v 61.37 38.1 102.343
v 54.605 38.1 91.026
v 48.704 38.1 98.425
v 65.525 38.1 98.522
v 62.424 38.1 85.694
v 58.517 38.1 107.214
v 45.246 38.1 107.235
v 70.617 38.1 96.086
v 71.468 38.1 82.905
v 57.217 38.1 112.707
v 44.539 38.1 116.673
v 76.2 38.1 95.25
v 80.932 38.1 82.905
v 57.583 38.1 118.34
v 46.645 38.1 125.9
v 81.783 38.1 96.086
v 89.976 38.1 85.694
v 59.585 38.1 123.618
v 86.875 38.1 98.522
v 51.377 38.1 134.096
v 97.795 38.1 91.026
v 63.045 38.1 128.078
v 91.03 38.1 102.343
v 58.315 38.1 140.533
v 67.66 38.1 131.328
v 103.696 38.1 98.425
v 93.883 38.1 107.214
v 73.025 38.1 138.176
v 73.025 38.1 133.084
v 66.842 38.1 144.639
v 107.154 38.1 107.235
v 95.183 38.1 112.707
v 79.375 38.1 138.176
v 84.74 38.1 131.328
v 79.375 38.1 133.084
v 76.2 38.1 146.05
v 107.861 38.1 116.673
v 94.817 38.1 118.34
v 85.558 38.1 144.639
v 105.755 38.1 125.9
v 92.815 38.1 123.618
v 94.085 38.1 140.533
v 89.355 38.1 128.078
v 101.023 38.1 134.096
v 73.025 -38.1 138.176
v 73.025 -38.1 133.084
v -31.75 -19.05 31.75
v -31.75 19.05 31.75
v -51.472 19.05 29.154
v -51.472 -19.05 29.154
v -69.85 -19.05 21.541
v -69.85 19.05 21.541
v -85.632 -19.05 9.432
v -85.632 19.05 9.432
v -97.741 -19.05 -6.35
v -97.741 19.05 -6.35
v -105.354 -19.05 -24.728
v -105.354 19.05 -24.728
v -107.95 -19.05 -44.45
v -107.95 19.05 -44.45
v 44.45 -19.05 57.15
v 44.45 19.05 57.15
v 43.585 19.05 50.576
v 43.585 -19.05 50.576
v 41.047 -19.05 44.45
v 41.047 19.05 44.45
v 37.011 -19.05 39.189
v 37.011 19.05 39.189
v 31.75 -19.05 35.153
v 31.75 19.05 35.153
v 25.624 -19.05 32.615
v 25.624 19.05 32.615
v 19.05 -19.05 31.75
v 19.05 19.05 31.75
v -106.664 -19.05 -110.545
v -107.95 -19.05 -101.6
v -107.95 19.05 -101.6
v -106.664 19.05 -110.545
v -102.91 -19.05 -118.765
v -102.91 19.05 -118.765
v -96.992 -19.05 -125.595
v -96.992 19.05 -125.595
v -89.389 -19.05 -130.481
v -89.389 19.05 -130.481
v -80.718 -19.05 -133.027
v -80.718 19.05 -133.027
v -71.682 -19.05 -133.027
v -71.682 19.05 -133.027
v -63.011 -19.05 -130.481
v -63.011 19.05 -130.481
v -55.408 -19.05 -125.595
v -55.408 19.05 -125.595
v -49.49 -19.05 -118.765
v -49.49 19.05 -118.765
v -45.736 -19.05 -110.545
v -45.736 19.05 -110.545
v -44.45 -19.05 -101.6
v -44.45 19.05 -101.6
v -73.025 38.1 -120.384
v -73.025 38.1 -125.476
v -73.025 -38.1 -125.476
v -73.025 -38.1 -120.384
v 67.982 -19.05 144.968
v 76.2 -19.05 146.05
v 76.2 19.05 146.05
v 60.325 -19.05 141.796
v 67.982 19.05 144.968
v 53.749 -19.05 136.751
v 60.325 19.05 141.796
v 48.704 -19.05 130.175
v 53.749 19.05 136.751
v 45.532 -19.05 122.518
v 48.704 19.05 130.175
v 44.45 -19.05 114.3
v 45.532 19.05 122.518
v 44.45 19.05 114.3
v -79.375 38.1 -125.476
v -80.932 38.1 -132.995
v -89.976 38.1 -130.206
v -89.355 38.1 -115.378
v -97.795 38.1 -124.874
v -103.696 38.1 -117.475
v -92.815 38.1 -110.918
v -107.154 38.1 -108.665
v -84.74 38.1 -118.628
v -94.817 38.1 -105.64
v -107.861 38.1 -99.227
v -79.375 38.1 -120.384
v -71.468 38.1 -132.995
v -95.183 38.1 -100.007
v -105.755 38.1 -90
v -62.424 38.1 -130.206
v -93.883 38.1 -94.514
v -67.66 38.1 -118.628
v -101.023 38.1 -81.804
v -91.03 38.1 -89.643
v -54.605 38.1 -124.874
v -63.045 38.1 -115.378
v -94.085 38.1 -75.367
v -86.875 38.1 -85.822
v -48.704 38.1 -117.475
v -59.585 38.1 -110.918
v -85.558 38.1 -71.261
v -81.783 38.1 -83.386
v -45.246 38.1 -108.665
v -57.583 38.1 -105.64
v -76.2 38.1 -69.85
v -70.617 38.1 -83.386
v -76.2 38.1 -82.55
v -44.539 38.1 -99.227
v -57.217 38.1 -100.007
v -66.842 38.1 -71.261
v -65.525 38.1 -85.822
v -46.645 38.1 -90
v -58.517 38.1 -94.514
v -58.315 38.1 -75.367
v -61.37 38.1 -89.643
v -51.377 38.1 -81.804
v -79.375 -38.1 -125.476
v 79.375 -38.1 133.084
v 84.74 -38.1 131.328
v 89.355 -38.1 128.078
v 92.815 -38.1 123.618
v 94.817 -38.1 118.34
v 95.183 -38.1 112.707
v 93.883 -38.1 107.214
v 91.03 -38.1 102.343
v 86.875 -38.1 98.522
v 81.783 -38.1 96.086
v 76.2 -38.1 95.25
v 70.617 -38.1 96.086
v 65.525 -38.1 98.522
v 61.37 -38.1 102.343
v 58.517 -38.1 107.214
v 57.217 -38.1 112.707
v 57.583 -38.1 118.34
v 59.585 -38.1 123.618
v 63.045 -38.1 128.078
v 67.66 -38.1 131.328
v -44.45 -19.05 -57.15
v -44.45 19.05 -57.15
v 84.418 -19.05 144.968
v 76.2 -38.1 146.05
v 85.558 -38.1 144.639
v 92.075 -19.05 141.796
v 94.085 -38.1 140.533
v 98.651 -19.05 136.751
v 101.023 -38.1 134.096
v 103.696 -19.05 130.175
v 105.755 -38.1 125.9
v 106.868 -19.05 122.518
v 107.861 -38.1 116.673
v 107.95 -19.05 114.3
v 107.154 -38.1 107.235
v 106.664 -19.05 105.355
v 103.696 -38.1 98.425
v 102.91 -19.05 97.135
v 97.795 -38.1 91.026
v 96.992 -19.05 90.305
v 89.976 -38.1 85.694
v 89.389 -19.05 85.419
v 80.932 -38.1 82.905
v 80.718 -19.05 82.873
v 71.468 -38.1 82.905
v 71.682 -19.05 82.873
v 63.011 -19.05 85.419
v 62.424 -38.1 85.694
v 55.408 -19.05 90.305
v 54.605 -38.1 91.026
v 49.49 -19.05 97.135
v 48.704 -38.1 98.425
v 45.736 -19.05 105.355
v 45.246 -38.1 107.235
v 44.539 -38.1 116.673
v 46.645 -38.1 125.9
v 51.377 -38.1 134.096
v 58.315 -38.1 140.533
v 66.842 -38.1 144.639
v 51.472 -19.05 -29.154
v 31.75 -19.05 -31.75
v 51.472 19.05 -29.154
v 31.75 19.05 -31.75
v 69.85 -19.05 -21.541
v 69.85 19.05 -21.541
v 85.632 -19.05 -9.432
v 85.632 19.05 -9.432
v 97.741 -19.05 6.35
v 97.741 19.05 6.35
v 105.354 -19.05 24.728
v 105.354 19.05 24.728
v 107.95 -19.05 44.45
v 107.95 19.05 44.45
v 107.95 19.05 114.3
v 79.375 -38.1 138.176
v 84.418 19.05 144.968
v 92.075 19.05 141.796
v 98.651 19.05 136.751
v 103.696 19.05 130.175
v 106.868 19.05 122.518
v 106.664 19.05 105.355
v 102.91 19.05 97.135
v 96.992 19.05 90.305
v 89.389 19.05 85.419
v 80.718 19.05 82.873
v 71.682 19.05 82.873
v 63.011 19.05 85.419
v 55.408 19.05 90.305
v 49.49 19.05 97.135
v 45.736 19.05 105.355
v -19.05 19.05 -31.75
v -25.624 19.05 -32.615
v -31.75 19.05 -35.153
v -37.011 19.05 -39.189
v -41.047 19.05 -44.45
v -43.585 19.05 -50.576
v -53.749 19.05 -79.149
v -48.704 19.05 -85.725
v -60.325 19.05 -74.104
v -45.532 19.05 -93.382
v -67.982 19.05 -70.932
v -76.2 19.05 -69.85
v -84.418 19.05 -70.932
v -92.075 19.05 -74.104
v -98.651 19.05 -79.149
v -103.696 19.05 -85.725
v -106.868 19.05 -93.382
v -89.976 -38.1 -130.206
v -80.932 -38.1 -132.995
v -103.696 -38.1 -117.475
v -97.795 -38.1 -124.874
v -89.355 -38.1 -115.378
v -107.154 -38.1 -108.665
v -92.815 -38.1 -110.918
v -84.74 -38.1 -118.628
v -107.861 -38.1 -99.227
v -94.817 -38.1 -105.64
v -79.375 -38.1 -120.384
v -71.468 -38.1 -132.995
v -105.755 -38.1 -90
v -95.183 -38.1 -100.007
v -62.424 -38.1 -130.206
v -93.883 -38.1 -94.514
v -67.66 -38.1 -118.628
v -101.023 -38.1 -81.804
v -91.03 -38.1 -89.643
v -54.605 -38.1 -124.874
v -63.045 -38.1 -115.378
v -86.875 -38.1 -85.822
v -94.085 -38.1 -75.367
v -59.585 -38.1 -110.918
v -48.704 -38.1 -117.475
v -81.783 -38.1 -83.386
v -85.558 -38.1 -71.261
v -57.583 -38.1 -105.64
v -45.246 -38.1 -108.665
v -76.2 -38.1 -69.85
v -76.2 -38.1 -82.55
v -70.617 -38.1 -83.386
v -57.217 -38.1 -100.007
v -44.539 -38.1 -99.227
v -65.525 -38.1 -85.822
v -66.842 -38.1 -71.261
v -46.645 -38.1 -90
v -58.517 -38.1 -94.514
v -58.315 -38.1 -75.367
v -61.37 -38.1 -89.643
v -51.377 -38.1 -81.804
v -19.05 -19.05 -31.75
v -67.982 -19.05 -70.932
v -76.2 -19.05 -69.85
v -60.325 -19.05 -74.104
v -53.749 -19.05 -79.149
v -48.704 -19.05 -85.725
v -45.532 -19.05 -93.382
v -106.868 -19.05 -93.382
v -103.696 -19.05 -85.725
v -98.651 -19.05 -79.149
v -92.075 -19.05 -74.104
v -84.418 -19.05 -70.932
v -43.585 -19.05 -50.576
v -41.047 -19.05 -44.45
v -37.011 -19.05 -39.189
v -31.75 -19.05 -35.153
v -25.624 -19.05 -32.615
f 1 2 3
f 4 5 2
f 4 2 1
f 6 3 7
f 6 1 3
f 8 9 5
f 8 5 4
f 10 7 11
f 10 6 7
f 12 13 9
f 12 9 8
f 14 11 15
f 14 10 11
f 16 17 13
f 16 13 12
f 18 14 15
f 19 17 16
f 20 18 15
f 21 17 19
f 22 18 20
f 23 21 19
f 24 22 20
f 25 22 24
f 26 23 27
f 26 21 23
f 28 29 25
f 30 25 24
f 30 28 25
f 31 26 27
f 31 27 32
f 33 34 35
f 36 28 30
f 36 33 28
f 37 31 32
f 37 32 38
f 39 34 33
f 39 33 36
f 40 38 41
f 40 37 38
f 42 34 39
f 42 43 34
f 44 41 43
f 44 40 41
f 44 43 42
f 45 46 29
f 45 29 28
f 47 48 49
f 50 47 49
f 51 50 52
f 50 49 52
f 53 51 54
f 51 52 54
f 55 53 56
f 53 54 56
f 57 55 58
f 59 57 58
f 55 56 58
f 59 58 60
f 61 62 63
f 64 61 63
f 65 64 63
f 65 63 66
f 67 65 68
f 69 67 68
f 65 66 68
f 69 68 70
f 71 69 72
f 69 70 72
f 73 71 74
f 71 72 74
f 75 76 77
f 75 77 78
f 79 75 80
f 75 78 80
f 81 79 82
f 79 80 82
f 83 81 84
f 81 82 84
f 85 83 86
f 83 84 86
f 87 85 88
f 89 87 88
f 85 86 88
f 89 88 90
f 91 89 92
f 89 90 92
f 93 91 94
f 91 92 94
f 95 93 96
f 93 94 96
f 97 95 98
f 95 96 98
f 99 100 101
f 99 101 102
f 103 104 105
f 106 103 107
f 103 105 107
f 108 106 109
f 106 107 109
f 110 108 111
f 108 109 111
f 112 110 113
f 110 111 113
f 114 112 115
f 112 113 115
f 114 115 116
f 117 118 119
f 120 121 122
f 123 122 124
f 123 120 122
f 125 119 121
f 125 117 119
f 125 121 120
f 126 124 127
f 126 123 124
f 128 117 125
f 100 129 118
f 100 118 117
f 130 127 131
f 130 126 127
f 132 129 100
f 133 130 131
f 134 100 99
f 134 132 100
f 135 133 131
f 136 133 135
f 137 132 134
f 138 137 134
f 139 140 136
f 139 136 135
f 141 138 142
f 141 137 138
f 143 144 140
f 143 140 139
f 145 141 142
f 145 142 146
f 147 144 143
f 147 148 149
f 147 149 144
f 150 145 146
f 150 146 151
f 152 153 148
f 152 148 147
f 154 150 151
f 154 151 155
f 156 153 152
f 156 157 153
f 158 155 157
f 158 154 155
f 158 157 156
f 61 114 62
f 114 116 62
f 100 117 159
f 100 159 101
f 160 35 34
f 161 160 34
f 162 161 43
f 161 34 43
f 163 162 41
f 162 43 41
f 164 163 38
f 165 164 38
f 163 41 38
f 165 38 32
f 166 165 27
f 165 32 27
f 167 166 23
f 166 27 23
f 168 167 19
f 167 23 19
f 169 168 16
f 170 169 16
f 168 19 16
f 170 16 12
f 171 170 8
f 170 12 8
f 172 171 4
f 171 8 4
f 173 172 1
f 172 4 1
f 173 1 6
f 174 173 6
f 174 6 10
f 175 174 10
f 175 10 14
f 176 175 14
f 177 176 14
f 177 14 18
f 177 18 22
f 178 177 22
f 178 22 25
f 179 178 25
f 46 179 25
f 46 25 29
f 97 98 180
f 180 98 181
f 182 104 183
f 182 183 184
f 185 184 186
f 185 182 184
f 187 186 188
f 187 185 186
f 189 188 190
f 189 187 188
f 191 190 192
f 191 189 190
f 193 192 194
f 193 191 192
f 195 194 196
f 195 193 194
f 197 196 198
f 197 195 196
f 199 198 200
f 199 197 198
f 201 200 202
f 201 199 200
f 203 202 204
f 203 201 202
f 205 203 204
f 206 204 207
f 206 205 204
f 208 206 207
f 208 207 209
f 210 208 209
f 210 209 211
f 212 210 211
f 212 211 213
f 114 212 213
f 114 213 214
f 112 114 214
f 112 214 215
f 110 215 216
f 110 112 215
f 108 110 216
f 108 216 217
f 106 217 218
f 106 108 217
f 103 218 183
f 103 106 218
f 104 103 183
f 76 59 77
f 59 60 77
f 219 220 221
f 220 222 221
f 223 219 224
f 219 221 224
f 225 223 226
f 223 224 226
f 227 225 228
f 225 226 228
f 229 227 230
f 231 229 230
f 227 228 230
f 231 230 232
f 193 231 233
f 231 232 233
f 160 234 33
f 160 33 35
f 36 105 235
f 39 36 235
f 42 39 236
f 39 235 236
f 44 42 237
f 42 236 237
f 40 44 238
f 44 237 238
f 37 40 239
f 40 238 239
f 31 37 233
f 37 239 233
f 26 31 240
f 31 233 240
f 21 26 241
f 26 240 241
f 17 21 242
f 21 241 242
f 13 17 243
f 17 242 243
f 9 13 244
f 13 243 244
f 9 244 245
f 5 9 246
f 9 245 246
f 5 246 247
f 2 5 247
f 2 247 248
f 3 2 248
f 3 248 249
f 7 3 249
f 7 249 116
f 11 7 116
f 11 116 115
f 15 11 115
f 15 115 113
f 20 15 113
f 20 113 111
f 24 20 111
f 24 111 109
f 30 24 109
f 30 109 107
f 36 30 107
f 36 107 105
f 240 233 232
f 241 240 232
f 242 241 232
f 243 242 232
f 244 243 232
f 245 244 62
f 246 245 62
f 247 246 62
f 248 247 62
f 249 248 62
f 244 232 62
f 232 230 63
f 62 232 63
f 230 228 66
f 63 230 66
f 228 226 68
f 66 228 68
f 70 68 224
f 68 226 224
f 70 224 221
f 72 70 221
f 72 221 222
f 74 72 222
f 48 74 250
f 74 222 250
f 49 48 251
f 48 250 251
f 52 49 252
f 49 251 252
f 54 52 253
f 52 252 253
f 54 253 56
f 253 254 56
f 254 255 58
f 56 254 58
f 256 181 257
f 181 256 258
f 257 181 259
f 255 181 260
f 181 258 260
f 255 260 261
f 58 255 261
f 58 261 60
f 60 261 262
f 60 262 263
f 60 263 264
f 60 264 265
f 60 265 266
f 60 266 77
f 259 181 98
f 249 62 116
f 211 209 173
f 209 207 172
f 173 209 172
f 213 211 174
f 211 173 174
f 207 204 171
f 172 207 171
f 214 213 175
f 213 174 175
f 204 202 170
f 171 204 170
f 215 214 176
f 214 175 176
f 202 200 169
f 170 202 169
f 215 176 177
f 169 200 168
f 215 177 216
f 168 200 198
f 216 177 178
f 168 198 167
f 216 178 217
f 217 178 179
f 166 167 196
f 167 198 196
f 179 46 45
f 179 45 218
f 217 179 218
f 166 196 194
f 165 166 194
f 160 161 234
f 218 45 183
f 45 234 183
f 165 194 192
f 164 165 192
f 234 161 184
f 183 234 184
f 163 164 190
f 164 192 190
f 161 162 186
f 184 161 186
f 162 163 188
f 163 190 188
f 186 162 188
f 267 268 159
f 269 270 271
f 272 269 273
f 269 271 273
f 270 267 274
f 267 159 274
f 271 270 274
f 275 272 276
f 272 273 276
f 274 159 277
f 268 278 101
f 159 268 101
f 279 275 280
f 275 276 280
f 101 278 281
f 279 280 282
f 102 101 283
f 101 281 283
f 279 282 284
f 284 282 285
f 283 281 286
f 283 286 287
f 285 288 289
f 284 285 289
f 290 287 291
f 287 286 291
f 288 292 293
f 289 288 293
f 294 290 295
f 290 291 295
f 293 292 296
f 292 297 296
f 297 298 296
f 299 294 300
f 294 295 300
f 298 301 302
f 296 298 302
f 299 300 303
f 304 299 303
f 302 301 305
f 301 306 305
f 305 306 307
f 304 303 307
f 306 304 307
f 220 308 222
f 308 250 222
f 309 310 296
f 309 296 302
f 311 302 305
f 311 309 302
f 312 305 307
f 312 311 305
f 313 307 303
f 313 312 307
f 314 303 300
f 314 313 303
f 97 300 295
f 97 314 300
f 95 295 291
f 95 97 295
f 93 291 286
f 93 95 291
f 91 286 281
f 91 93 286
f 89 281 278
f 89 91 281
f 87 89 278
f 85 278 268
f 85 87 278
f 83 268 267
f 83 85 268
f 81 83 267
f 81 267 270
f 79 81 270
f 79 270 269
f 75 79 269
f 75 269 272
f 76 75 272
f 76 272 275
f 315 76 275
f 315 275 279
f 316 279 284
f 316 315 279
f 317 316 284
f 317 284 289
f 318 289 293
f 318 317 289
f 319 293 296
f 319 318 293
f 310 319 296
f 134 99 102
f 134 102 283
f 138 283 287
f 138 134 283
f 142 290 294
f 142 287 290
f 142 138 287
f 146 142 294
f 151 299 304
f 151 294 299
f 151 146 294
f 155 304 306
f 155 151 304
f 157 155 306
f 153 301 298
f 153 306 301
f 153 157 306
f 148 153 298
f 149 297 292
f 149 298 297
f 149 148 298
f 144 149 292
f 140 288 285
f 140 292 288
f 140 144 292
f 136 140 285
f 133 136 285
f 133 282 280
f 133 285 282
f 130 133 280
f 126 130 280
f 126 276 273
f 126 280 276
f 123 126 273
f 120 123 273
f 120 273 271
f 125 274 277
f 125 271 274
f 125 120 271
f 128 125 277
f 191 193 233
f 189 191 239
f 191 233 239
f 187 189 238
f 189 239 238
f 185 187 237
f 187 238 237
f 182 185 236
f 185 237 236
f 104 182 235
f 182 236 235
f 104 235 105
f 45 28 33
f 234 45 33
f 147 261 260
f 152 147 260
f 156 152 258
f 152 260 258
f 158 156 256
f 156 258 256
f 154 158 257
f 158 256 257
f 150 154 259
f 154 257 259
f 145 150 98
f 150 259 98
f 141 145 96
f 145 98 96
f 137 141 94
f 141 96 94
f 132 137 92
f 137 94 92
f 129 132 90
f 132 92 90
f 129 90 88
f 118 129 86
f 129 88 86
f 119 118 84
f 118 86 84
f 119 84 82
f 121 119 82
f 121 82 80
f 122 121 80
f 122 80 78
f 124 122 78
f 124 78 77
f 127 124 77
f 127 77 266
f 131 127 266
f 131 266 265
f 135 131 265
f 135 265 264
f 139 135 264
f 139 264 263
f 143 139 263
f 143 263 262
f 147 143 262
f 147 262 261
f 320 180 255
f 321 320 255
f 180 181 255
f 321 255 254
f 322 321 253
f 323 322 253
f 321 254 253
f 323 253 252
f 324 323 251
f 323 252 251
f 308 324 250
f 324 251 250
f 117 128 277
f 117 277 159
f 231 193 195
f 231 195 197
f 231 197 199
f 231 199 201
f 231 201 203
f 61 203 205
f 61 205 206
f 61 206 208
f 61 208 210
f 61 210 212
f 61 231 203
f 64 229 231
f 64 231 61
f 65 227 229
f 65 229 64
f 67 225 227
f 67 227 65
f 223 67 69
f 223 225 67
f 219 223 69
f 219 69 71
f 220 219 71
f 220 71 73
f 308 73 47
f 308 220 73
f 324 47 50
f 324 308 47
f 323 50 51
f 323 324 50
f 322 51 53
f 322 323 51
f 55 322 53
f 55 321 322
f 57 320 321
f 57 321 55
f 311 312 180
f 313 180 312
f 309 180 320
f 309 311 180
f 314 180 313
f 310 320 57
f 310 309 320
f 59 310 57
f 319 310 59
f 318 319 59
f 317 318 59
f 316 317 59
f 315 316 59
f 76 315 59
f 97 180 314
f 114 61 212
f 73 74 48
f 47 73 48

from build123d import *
from build123d.topology import SkipClean

# Parameters (mm, degrees)
BOSS_EXTRUDE1_DEPTH      = 19.05
BOSS_EXTRUDE2_DEPTH      = 19.05
BOSS_EXTRUDE2_DEPTH_BACK = 57.15
SKETCH2_R                = 31.75
CUT_EXTRUDE1_DEPTH       = 197.952392725


with BuildPart() as part:
    # Sketch1 → Boss-Extrude1 (new, symmetric)
    with BuildSketch(Plane(origin=(0, 0, 0), x_dir=(1, 0, 0), z_dir=(0, 1, 0))):
        with BuildLine():
            Line((0, -31.75), (-31.75, -31.75))
            ThreePointArc((-31.75, -31.75), (-85.631536726, -9.431536726), (-107.95, 44.45))
            Line((-107.95, 44.45), (-107.95, 101.6))
            ThreePointArc((-107.95, 101.6), (-76.2, 133.35), (-44.45, 101.6))
            Line((-44.45, 101.6), (-44.45, 57.15))
            ThreePointArc((-44.45, 57.15), (-37.010512242, 39.189487758), (-19.05, 31.75))
            Line((-19.05, 31.75), (0, 31.75))
            Line((0, 31.75), (31.75, 31.75))
            ThreePointArc((31.75, 31.75), (85.631536726, 9.431536726), (107.95, -44.45))
            Line((107.95, -44.45), (107.95, -114.3))
            ThreePointArc((107.95, -114.3), (76.2, -146.05), (44.45, -114.3))
            Line((44.45, -114.3), (44.45, -57.15))
            ThreePointArc((44.45, -57.15), (37.010512242, -39.189487758), (19.05, -31.75))
            Line((19.05, -31.75), (0, -31.75))
        make_face()
    extrude(amount=BOSS_EXTRUDE1_DEPTH, both=True)

    # Sketch2 → Boss-Extrude2 (add, two sides: drawn at the far end of the back side and taken through both)
    with SkipClean():  # the faces are left unmerged after this step: merging them gives an invalid solid
        with BuildSketch(Plane(origin=(0, 19.05, 0), x_dir=(1, 0, 0), z_dir=(0, 1, 0)).offset(-BOSS_EXTRUDE2_DEPTH_BACK)):
            with Locations((-76.2, 101.6)):
                Circle(SKETCH2_R)
            with Locations((76.2, -114.3)):
                Circle(SKETCH2_R)
        extrude(amount=BOSS_EXTRUDE2_DEPTH + BOSS_EXTRUDE2_DEPTH_BACK)

    # Sketch3 → Cut-Extrude1 (cut, through all)
    with SkipClean():  # the faces are left unmerged after this step: merging them gives an invalid solid
        with BuildSketch(Plane(origin=(0, 38.1, 0), x_dir=(1, 0, 0), z_dir=(0, 1, 0))):
            with BuildLine():
                Line((-79.375, 125.476), (-73.025, 125.476))
                Line((-73.025, 125.476), (-73.025, 120.383553311))
                ThreePointArc((-73.025, 120.383553311), (-76.2, 82.55), (-79.375, 120.383553311))
                Line((-79.375, 120.383553311), (-79.375, 125.476))
            make_face()
            with BuildLine():
                Line((73.025, -138.176), (79.375, -138.176))
                Line((79.375, -138.176), (79.375, -133.083553311))
                ThreePointArc((79.375, -133.083553311), (76.2, -95.25), (73.025, -133.083553311))
                Line((73.025, -133.083553311), (73.025, -138.176))
            make_face()
        extrude(amount=-CUT_EXTRUDE1_DEPTH, mode=Mode.SUBTRACT)


solid = part.part
